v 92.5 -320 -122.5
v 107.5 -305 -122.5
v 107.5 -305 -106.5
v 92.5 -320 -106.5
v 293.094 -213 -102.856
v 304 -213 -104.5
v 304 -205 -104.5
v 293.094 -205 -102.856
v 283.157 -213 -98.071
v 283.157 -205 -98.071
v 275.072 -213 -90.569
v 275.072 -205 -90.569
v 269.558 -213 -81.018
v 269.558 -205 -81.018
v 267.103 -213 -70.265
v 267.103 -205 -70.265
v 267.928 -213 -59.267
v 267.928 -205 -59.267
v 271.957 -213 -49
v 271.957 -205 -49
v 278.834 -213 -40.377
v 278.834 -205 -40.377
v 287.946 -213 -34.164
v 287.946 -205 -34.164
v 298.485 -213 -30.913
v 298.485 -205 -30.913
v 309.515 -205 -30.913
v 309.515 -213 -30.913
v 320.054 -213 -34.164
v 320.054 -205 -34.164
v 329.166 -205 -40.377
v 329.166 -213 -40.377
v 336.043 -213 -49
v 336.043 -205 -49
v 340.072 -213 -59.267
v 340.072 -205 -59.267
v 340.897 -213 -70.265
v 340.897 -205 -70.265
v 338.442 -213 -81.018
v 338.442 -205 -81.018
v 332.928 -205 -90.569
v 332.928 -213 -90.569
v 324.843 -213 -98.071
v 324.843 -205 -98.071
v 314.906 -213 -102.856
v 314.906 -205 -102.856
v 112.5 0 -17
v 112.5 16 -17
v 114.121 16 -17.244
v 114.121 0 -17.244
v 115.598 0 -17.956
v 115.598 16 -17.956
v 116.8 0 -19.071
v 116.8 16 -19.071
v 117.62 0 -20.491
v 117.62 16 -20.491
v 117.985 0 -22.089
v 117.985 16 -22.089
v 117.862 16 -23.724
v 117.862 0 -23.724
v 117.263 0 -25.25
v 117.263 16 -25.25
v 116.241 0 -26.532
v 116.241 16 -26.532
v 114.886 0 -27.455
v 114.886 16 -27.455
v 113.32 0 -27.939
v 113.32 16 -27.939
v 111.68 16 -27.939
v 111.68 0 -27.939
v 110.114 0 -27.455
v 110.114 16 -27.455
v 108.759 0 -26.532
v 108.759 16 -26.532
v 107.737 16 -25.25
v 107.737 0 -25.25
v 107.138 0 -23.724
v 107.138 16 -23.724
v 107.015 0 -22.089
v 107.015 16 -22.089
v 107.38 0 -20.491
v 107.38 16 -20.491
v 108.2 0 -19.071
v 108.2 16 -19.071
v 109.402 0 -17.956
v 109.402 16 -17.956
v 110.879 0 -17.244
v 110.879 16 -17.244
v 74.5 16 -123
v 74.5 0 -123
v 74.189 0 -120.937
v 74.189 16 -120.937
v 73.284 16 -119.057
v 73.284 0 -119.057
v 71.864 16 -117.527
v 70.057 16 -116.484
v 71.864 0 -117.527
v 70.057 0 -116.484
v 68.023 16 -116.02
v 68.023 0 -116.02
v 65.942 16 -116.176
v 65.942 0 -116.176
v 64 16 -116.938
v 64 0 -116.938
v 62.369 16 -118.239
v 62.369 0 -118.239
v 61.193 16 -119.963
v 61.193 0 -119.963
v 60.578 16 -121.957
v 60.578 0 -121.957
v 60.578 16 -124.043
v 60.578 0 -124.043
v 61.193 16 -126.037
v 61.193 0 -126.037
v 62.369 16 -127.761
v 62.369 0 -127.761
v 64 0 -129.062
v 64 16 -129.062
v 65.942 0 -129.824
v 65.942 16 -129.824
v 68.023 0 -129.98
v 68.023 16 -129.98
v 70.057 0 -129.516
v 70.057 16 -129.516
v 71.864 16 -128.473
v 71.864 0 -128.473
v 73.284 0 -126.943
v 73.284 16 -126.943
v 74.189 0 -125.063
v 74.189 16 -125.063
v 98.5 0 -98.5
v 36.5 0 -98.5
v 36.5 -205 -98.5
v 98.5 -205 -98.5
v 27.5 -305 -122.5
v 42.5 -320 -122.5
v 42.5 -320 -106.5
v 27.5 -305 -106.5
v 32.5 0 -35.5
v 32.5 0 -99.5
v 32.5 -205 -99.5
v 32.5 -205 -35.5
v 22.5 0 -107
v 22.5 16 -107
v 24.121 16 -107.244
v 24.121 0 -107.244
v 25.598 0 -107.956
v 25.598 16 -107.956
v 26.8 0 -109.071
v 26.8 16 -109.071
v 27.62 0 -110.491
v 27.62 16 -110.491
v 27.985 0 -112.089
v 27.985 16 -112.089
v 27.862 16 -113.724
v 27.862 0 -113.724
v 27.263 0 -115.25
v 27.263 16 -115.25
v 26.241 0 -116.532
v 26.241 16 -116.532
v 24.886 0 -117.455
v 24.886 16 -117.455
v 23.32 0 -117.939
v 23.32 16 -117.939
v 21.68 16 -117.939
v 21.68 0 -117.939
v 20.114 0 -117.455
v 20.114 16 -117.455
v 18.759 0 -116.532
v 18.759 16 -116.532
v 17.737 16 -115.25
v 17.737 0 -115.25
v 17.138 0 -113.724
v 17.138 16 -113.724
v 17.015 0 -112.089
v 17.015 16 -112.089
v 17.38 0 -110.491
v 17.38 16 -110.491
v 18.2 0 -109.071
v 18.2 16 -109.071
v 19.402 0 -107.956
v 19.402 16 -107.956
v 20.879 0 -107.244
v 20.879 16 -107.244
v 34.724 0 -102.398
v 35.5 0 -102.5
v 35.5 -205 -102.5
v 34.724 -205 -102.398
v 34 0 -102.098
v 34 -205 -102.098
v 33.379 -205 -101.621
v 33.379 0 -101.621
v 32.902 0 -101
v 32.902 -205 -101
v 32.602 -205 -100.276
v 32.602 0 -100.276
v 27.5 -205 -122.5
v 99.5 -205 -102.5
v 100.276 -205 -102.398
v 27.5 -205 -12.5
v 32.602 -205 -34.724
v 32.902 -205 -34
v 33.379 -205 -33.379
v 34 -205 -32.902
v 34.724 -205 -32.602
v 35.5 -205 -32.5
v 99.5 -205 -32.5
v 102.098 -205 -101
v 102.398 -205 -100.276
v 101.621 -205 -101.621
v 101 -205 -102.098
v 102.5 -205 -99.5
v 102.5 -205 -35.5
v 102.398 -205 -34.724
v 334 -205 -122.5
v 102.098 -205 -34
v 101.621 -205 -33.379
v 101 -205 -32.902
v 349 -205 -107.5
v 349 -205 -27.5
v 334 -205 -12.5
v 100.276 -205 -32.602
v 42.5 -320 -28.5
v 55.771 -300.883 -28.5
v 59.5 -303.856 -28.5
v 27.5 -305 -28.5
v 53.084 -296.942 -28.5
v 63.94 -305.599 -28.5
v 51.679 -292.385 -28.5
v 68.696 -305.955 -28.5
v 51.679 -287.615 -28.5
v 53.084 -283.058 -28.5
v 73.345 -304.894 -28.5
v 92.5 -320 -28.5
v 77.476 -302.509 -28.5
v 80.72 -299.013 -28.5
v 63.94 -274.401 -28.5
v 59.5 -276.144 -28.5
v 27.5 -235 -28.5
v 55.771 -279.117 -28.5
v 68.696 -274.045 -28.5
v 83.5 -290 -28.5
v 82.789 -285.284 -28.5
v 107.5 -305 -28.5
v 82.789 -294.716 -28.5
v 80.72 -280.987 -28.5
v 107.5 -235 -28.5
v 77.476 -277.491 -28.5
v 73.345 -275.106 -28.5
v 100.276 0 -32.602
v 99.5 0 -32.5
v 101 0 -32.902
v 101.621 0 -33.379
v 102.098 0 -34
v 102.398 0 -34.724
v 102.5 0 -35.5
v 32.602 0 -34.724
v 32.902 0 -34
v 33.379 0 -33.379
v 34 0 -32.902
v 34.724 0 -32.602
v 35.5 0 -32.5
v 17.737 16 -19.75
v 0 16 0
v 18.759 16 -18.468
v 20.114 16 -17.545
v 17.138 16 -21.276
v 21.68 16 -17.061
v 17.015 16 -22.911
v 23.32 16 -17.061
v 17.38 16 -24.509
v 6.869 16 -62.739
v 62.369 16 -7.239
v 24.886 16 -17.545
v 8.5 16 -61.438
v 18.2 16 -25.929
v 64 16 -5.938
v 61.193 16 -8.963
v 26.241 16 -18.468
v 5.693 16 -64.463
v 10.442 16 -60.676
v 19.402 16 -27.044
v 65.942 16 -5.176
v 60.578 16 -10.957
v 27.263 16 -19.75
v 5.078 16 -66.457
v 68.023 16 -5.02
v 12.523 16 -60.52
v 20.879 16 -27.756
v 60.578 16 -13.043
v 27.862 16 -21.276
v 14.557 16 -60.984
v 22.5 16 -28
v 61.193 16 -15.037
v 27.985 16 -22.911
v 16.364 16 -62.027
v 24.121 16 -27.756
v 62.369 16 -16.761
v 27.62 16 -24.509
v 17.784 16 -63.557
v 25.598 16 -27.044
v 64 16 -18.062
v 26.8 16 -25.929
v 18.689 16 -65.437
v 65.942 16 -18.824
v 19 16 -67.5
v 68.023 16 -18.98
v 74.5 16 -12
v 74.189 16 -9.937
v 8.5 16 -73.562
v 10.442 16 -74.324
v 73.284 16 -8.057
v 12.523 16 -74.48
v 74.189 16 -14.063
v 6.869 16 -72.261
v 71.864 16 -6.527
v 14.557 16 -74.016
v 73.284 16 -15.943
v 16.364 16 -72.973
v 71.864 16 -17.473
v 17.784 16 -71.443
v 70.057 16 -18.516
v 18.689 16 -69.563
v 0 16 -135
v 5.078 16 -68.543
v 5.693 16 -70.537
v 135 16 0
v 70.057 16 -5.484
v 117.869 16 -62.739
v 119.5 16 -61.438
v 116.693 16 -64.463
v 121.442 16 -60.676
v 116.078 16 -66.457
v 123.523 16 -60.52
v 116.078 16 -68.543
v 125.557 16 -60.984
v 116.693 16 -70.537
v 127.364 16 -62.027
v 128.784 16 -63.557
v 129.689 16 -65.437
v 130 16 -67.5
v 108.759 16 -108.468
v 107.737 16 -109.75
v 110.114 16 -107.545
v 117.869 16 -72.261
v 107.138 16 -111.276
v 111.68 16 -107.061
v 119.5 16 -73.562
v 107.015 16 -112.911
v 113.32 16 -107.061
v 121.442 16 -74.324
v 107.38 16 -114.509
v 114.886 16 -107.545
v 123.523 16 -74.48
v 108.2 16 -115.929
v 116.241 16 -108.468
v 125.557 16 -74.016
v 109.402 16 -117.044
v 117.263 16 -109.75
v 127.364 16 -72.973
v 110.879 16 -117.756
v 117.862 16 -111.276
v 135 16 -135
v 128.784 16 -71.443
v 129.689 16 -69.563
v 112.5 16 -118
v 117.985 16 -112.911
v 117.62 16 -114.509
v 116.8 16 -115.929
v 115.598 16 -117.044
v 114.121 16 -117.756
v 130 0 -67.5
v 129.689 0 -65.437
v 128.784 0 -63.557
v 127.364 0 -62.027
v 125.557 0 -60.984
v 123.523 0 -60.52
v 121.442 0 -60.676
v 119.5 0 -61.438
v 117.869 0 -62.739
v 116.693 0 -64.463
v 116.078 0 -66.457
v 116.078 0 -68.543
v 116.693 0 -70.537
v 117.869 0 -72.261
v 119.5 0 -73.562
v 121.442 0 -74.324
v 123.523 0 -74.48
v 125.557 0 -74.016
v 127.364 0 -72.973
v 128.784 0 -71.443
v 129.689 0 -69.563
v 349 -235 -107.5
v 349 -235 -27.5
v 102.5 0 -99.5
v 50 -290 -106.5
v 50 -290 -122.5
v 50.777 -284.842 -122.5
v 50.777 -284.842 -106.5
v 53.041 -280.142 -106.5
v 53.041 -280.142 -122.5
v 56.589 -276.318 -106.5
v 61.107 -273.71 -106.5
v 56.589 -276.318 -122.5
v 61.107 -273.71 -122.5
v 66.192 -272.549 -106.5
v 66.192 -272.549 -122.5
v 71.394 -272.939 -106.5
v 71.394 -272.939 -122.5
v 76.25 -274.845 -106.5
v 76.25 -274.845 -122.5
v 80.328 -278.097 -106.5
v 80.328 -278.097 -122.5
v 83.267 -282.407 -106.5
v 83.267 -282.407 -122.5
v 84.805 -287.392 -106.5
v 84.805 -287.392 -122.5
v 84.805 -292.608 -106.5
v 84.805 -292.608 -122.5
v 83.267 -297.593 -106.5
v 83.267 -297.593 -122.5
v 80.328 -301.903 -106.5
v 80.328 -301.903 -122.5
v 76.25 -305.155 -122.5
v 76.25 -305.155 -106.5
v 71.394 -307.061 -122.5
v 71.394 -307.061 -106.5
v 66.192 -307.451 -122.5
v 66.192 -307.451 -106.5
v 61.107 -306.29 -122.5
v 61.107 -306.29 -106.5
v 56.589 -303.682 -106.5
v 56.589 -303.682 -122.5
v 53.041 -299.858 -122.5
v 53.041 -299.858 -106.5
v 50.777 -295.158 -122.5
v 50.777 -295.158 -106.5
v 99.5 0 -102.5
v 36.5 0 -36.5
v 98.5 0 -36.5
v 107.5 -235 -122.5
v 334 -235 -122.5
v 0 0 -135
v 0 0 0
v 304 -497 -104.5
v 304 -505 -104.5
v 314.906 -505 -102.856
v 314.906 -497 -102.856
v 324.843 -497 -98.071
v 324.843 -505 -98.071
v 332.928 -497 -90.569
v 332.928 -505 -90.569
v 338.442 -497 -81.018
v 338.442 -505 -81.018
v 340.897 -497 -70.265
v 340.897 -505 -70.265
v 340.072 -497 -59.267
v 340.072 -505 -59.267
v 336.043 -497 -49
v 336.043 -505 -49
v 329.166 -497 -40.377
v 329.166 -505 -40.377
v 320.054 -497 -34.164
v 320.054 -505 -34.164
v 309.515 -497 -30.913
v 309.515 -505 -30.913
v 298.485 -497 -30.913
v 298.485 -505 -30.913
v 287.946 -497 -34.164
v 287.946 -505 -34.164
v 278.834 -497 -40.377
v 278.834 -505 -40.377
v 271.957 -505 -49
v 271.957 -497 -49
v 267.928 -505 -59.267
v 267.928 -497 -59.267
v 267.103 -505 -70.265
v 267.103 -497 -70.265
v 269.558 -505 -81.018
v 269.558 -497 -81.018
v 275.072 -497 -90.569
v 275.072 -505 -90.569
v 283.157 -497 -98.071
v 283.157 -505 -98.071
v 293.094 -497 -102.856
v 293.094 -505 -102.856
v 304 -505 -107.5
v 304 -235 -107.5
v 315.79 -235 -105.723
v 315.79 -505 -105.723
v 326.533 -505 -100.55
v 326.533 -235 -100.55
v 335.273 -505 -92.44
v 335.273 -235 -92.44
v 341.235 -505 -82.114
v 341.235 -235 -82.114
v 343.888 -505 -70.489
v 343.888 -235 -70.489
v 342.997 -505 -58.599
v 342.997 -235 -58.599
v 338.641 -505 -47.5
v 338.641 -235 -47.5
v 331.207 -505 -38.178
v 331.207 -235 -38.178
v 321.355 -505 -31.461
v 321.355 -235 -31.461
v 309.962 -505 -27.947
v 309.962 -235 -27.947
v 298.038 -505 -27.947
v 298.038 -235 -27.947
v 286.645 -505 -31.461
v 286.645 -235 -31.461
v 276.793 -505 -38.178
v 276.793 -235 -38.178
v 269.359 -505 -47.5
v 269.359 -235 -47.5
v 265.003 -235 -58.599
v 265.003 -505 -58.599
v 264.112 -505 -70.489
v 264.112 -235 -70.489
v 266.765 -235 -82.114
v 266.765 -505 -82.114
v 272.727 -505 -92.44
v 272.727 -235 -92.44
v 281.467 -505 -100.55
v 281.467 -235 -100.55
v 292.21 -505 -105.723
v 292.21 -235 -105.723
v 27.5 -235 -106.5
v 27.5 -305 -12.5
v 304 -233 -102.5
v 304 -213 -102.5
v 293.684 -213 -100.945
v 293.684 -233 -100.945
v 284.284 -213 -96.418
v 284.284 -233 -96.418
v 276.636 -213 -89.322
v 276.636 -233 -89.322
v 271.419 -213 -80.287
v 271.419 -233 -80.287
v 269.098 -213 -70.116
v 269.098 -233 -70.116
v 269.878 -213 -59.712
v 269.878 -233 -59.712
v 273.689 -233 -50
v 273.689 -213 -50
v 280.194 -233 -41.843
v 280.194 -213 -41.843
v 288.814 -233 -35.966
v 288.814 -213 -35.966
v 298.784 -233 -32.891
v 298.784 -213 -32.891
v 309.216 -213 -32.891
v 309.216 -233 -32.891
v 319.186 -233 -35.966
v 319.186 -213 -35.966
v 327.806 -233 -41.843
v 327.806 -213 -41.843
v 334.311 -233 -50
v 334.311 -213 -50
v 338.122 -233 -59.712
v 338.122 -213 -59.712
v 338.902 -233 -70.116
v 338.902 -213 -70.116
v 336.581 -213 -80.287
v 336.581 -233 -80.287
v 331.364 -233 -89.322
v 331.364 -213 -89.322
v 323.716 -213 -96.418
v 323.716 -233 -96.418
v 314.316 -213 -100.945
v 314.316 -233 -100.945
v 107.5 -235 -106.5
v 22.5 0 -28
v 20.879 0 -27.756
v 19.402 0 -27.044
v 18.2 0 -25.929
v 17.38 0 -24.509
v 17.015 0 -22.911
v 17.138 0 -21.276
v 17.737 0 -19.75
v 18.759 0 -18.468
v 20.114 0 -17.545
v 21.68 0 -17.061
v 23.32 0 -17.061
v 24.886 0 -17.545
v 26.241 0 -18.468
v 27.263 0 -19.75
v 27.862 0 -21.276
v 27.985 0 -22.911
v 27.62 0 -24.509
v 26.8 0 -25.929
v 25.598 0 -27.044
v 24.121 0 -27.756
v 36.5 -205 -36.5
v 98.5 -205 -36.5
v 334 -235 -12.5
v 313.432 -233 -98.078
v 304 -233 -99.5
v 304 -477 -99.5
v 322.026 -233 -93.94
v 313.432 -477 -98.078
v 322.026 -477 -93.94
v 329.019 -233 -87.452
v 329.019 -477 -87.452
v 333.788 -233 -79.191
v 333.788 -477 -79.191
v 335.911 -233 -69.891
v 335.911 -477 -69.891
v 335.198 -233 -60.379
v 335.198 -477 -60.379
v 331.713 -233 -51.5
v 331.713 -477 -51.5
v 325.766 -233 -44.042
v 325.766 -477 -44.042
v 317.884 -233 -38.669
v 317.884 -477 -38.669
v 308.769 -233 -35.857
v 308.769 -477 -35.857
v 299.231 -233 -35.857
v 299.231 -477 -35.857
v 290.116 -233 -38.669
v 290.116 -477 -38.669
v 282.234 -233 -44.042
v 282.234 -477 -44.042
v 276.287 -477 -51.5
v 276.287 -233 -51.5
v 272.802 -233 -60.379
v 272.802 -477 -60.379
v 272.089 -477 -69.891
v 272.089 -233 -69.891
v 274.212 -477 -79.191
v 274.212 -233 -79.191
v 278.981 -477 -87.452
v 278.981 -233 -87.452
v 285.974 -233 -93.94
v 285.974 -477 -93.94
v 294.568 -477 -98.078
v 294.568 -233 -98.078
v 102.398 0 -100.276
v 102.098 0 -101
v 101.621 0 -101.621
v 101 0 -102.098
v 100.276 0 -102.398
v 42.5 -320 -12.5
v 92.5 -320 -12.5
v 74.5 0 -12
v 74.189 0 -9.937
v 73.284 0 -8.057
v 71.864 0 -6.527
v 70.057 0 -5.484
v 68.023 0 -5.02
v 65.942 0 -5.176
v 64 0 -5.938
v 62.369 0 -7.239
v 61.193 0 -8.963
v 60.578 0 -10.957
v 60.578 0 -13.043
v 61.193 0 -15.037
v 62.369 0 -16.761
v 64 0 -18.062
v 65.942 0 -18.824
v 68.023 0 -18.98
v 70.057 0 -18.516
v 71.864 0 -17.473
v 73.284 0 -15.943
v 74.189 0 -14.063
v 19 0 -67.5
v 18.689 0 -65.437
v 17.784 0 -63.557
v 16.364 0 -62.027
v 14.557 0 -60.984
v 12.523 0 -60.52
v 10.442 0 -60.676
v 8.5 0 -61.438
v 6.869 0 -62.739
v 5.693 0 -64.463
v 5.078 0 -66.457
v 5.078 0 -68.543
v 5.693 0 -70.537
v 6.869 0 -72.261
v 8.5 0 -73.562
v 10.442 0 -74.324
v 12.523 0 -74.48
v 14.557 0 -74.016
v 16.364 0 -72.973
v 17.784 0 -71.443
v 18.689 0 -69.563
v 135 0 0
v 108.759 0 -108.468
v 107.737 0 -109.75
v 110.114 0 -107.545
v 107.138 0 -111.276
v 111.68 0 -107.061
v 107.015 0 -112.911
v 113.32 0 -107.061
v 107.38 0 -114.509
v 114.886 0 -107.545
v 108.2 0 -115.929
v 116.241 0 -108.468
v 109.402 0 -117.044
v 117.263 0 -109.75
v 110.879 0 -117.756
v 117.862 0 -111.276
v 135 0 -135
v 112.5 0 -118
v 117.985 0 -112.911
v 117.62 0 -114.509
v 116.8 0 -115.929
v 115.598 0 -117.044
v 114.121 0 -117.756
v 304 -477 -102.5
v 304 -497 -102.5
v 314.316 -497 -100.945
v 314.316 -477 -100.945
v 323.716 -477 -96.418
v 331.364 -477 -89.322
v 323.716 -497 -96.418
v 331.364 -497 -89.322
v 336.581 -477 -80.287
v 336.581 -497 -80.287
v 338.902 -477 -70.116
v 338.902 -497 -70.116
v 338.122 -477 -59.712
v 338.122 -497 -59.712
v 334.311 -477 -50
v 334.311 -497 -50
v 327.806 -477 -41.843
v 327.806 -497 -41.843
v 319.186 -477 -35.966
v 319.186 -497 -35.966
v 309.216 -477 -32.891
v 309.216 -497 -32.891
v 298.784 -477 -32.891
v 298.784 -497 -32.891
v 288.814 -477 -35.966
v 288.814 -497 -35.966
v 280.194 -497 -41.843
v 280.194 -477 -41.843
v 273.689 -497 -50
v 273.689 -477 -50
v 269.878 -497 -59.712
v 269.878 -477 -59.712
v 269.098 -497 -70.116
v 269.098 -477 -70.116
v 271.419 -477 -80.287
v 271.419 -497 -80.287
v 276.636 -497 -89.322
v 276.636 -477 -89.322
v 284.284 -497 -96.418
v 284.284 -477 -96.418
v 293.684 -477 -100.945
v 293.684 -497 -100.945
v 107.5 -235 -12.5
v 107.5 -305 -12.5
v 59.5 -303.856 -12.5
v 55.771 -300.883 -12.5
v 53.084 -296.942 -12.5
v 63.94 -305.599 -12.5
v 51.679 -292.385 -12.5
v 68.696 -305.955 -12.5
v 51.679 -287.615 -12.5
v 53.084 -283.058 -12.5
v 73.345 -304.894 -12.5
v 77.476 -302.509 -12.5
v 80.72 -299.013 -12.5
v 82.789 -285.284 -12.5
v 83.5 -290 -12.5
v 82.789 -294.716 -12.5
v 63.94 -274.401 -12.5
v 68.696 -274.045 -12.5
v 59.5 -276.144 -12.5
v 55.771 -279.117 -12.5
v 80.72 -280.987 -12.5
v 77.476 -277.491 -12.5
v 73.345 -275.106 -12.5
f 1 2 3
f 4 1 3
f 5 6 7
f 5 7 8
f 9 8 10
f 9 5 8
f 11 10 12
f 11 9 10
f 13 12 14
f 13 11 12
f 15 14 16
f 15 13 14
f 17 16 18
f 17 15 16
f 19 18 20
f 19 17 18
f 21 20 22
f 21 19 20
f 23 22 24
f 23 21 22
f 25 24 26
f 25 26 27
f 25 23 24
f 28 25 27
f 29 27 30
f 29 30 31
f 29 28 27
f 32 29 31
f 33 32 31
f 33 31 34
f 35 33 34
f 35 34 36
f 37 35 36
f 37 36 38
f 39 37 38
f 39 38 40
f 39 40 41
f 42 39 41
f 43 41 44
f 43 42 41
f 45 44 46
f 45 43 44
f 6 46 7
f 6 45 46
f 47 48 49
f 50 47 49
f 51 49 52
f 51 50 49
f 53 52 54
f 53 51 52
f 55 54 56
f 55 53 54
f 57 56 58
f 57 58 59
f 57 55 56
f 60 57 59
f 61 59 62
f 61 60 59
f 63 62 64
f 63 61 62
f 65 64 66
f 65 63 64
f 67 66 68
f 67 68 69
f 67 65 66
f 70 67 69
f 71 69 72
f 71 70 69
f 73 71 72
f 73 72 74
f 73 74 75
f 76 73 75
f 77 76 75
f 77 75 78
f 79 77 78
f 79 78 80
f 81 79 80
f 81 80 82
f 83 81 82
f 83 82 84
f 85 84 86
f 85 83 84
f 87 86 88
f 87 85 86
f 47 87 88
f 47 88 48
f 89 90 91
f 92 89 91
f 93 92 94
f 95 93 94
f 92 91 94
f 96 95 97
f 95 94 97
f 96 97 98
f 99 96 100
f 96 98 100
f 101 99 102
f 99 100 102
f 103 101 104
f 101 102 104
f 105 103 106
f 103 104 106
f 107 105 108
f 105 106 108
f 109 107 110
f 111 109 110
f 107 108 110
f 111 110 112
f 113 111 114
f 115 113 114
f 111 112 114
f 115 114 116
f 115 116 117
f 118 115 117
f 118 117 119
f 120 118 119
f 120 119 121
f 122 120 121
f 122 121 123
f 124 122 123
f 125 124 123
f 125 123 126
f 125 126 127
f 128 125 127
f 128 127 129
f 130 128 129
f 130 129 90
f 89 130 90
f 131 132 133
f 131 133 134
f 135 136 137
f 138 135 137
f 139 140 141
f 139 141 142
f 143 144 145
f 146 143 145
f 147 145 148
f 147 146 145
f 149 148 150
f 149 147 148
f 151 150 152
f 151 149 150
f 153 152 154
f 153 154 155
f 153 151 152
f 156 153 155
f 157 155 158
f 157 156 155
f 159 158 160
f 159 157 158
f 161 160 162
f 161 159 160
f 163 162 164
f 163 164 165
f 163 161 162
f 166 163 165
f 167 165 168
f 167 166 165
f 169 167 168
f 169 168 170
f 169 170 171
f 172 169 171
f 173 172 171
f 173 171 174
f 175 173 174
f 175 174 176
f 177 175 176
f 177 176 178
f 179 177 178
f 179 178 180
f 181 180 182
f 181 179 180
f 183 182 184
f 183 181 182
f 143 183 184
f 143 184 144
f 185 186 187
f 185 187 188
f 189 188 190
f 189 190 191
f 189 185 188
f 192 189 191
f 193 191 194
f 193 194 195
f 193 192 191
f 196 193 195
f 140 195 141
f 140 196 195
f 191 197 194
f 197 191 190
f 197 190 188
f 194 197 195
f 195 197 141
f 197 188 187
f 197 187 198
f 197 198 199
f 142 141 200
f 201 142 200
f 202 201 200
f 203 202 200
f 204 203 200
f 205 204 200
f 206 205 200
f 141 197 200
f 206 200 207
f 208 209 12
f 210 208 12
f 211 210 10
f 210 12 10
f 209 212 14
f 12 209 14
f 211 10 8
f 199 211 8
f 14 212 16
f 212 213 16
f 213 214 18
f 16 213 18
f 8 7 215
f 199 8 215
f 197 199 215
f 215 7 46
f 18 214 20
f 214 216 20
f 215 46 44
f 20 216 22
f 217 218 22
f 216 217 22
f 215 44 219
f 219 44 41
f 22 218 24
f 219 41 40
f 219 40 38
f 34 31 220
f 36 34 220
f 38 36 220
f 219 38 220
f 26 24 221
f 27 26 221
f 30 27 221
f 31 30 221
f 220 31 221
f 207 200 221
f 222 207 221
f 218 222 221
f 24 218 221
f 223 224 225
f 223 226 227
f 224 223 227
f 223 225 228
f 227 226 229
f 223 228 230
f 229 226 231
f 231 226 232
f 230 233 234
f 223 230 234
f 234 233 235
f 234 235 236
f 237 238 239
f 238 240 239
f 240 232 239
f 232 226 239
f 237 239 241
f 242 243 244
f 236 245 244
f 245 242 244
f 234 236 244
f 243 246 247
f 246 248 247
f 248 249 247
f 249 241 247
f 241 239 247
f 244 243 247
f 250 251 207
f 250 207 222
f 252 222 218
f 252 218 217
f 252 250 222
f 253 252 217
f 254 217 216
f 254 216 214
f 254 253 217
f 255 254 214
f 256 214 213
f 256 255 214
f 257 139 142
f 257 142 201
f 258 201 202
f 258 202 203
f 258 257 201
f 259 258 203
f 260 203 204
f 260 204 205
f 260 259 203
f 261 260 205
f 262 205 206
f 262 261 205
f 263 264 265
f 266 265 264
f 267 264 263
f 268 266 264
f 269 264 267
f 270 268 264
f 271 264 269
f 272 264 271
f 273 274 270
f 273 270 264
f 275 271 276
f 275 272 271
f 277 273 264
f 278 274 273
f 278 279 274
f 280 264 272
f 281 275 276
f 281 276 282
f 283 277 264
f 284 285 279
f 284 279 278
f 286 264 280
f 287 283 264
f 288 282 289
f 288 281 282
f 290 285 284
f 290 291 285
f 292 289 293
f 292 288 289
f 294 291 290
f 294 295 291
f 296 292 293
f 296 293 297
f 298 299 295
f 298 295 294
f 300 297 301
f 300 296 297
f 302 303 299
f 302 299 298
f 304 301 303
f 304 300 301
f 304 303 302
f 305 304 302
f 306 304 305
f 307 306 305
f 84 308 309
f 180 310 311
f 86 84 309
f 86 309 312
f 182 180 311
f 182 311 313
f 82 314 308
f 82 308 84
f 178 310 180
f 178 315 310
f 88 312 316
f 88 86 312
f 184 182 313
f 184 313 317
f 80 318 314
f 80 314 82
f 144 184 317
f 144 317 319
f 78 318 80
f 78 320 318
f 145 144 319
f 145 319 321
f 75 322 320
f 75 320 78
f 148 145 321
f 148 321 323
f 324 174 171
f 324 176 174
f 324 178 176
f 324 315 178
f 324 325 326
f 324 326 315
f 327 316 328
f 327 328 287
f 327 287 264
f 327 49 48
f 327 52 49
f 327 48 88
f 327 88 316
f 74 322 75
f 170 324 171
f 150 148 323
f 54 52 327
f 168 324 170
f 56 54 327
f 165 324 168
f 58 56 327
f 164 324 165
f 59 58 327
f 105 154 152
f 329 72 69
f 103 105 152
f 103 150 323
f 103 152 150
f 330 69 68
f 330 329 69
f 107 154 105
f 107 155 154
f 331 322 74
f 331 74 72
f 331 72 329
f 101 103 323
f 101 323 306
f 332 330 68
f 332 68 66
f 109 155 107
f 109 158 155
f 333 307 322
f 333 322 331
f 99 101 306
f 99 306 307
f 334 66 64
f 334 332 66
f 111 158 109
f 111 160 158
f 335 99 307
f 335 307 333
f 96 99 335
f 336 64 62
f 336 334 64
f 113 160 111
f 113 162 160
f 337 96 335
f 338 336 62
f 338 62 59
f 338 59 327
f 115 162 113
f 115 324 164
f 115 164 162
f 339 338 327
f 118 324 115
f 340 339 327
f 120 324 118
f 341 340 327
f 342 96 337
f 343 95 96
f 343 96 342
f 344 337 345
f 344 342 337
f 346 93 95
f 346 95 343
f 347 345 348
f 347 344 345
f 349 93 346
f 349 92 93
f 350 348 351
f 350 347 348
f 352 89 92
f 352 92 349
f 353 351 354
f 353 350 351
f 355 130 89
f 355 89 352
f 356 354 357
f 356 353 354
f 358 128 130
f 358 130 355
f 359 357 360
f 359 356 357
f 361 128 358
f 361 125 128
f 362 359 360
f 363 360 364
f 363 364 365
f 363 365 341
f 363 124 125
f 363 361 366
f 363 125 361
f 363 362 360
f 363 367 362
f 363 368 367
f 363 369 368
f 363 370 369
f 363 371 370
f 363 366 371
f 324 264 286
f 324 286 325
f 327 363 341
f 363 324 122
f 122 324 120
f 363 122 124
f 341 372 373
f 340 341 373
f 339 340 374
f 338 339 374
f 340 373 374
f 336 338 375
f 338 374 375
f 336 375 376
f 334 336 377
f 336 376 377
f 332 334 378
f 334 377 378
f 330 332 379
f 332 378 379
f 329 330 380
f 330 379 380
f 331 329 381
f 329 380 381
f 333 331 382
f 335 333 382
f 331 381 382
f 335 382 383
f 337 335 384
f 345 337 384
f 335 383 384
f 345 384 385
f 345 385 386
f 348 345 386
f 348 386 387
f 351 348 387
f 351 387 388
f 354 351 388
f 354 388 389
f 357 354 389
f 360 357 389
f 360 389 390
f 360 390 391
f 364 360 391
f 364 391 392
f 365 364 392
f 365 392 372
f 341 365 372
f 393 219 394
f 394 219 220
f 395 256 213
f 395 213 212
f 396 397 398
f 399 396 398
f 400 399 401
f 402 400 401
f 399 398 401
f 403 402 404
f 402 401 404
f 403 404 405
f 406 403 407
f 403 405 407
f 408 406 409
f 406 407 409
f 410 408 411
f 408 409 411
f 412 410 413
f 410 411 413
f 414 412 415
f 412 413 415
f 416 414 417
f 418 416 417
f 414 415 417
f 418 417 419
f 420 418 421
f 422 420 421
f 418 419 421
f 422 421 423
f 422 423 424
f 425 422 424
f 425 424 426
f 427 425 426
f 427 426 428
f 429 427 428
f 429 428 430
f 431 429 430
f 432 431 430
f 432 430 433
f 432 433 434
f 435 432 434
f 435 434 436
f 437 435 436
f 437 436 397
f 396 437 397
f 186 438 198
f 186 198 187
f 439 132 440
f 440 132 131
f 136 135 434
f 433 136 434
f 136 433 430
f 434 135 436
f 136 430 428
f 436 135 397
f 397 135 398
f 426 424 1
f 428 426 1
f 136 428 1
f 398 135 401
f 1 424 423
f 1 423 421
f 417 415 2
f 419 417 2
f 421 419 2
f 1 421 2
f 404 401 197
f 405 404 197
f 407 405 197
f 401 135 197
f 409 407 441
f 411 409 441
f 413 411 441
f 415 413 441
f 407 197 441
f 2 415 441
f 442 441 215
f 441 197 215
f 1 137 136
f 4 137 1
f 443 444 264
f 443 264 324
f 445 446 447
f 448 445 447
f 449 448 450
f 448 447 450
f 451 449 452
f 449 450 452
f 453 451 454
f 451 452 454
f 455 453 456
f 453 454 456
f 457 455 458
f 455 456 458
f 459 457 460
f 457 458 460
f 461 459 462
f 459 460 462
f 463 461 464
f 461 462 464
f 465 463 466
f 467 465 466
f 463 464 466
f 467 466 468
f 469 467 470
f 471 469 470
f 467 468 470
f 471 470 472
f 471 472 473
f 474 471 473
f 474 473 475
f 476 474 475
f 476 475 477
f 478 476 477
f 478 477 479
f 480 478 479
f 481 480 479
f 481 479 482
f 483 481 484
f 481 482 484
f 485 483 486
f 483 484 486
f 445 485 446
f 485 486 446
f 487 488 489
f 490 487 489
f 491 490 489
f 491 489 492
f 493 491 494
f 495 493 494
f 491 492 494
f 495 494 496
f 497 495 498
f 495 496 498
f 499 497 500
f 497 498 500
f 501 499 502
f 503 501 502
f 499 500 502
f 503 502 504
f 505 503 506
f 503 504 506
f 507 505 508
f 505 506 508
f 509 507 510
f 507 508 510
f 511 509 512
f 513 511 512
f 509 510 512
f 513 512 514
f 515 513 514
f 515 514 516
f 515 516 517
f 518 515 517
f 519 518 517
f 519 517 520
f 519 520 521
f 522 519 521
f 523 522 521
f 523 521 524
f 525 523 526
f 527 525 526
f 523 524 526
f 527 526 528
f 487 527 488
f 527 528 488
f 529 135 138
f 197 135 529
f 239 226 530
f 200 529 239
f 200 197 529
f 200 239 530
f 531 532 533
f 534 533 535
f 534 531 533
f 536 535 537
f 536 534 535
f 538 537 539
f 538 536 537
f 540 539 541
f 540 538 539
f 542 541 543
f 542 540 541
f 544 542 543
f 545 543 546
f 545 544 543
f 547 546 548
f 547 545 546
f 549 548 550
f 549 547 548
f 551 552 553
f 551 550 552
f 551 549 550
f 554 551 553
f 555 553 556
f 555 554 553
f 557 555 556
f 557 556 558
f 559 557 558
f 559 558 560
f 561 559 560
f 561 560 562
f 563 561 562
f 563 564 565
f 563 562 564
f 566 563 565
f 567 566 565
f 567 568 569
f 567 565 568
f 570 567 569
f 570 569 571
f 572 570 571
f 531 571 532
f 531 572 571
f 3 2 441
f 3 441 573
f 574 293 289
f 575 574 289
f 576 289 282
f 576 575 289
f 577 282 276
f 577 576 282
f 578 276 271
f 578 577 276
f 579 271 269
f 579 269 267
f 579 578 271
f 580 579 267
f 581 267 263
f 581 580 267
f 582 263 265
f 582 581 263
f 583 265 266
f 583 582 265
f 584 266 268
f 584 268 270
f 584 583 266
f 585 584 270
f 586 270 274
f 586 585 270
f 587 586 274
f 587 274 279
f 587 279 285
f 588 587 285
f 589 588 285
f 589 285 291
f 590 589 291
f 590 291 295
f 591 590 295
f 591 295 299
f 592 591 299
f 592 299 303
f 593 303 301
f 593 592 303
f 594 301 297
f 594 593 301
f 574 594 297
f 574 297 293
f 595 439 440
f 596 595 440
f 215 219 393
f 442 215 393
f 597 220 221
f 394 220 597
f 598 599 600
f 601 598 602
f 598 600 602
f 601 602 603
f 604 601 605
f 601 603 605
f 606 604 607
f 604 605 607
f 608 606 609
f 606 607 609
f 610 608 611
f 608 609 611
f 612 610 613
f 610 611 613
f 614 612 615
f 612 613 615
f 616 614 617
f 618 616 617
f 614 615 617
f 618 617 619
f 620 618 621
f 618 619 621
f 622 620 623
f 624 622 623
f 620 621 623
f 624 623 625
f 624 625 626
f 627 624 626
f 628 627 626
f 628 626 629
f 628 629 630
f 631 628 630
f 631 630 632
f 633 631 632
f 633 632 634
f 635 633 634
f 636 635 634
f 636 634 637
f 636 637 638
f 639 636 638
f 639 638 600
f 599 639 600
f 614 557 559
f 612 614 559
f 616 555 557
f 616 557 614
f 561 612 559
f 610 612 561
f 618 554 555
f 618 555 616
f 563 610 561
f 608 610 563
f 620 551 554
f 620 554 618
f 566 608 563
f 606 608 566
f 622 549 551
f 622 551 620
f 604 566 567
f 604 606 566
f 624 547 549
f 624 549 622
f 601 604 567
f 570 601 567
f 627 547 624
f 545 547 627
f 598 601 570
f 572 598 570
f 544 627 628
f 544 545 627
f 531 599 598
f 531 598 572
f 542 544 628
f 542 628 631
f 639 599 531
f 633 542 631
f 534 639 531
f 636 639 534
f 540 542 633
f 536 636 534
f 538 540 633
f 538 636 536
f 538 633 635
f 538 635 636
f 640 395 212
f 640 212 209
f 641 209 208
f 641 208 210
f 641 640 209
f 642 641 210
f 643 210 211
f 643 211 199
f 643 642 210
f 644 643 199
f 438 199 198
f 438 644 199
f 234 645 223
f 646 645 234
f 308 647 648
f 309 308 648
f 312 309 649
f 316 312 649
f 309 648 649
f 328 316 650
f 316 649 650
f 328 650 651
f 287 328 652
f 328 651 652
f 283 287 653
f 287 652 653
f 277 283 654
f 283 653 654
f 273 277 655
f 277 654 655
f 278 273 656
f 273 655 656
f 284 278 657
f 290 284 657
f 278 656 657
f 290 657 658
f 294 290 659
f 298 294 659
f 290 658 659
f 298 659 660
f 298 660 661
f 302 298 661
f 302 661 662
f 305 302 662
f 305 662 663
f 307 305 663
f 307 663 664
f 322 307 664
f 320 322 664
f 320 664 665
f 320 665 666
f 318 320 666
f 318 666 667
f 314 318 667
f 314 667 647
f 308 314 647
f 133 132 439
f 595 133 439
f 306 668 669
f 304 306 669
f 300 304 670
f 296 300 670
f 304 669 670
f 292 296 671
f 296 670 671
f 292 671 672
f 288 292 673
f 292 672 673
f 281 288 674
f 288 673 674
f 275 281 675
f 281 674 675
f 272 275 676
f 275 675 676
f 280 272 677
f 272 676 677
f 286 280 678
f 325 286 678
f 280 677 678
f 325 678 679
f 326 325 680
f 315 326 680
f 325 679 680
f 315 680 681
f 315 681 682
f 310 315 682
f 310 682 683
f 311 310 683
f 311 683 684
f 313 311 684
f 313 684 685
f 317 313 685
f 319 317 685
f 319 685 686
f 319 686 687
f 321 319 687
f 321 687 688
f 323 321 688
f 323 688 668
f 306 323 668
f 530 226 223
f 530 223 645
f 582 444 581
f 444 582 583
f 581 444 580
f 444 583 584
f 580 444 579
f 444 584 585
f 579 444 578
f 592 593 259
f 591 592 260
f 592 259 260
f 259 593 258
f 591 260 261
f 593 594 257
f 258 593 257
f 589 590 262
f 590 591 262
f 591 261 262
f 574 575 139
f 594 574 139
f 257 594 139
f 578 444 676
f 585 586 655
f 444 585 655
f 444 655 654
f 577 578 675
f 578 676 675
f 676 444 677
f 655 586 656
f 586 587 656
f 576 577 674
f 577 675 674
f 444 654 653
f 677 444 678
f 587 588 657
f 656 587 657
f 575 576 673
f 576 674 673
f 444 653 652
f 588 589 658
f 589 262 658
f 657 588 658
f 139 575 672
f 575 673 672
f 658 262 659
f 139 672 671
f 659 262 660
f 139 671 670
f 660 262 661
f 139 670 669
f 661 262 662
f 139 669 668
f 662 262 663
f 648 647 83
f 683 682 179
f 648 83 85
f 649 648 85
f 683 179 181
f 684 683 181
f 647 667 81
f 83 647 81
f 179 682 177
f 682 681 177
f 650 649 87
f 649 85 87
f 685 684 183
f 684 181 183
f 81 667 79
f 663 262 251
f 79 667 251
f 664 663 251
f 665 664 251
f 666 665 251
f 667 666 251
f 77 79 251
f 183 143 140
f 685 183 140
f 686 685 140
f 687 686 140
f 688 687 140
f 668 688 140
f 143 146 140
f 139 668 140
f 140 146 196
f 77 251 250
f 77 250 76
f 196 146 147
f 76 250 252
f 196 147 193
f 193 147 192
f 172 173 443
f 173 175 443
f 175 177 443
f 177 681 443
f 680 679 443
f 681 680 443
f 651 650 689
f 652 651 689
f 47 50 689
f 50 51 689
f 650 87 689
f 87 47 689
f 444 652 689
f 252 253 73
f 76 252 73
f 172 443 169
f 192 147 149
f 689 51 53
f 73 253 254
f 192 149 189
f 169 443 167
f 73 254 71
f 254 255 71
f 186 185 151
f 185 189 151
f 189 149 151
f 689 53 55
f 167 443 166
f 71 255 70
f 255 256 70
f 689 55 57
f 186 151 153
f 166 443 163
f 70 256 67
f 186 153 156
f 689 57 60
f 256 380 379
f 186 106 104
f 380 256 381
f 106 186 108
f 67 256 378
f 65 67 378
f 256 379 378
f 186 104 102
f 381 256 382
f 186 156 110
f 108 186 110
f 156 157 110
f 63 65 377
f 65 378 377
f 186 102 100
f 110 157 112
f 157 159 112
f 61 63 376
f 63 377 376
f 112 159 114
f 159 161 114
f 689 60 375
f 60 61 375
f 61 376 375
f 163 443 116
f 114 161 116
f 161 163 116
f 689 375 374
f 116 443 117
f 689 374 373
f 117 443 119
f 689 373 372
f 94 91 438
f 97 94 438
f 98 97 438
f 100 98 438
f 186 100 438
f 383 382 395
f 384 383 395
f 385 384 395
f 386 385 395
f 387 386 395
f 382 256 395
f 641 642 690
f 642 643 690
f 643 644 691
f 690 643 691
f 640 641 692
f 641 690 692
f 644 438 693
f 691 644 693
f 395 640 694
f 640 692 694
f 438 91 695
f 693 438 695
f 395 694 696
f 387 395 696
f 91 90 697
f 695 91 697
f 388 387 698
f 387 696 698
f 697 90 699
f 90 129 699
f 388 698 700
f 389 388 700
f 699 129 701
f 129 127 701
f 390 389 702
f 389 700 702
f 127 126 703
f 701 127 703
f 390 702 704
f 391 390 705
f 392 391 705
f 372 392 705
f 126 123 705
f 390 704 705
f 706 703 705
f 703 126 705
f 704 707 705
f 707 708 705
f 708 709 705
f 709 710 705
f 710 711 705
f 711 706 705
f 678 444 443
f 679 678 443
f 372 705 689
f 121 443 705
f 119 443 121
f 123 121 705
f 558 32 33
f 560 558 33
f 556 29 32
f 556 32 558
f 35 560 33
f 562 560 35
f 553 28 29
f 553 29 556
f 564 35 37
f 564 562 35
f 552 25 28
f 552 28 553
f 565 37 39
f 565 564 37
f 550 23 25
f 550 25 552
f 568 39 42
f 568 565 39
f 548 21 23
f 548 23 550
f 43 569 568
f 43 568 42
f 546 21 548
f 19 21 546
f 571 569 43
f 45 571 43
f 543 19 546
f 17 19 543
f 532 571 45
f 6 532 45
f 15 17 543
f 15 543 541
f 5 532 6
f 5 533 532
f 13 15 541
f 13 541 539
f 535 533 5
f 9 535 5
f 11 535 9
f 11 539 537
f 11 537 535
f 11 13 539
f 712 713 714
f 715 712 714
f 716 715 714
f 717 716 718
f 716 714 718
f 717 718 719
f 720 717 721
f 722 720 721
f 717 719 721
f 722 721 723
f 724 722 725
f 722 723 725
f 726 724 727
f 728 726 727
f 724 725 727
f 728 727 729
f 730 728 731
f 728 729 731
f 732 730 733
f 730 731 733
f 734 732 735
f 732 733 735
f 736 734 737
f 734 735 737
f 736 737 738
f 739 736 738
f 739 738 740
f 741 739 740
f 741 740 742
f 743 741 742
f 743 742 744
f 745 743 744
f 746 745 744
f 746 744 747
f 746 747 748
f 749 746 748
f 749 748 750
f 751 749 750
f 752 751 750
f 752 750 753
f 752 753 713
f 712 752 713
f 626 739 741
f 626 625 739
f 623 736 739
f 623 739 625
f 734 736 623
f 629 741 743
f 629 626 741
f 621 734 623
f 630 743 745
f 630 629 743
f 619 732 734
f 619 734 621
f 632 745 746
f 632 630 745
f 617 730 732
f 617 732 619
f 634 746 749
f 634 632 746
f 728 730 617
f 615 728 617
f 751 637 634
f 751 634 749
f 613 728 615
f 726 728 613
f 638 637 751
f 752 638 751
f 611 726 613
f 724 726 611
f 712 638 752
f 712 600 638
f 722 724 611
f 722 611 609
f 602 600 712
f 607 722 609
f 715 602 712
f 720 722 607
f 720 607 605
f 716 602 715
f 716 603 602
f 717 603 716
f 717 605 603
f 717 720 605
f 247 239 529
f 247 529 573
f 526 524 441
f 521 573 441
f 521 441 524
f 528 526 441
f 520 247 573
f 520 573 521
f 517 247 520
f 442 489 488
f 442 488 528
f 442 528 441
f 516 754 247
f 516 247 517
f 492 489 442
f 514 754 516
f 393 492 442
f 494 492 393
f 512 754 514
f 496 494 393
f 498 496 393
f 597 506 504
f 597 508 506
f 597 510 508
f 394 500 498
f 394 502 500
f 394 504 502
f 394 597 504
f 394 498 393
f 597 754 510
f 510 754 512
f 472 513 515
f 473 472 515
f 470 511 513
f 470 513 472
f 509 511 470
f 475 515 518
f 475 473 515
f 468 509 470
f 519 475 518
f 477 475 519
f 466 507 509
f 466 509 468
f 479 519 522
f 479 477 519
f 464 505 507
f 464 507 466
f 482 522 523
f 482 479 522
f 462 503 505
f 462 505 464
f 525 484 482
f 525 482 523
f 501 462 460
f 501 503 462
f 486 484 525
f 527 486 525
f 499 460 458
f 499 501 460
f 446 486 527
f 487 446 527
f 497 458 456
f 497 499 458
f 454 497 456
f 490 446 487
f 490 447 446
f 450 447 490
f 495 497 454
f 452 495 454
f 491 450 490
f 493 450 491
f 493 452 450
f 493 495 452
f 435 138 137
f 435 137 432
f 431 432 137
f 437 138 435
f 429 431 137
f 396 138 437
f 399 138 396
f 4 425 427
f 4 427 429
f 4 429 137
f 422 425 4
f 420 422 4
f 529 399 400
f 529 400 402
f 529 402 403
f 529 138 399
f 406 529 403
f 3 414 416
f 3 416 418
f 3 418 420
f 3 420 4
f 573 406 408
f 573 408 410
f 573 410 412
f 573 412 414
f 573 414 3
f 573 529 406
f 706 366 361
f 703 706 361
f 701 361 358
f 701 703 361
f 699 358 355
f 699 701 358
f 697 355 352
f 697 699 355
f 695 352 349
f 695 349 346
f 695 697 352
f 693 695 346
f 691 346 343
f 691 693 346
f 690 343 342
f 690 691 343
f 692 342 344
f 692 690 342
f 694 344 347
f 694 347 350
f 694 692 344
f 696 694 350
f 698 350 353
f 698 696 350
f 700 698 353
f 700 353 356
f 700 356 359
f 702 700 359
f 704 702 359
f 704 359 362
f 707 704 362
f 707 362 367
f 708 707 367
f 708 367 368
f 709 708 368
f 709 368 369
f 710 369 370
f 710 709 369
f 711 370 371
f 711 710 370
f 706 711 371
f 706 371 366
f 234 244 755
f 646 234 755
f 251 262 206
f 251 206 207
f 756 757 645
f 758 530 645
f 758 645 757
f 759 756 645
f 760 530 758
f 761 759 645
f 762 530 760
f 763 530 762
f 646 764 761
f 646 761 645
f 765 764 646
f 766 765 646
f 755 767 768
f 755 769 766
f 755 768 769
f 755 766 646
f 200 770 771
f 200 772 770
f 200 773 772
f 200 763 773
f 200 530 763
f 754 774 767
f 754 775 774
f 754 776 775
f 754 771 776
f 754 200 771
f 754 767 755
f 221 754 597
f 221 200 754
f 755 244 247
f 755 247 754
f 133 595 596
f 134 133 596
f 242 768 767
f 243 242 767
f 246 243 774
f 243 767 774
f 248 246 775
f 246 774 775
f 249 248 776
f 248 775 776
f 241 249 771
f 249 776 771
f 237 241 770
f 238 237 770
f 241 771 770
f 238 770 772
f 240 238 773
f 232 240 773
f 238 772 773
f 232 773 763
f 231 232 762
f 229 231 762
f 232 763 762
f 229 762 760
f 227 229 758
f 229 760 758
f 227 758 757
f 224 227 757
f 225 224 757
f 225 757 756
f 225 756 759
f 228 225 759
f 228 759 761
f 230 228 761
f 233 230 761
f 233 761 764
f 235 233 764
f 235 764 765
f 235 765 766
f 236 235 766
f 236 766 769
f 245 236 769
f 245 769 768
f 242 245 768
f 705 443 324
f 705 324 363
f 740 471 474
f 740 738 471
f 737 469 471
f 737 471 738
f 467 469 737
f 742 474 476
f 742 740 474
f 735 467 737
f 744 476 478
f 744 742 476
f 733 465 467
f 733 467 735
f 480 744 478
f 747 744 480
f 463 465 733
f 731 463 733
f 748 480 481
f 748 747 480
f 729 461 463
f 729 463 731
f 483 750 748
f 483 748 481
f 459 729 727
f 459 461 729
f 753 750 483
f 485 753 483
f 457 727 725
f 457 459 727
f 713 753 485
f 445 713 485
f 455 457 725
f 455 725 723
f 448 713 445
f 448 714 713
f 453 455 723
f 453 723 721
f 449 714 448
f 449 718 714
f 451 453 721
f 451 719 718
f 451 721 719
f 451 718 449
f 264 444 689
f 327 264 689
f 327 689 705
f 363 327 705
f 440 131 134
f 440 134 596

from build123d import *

# Parameters (mm, degrees)
SCHIZZO1_W                = 135
SCHIZZO1_H                = 135
SCHIZZO1_R                = 5.5
ESTRUSIONE1_DEPTH         = 16
SCHIZZO2_W                = 62
SCHIZZO2_H                = 62
ESTRUSIONE_SOTTILE1_DEPTH = 205
SCHIZZO3_W                = 321.5
SCHIZZO3_H                = 110
ESTRUSIONE2_DEPTH         = 30
SCHIZZO4_R                = 40
ESTRUSIONE3_DEPTH         = 270
SCHIZZO6_R                = 32
ESTRUSIONE4_DEPTH         = 642.456935421
SCHIZZO7_R                = 35
ESTRUSIONE5_DEPTH         = 28
ESTRUSIONE6_START         = -28
SCHIZZO8_R                = 35
ESTRUSIONE6_DEPTH         = 28
SCHIZZO9_W                = 80
SCHIZZO9_H                = 16
ESTRUSIONE7_DEPTH         = 85
SCHIZZO10_R               = 16
ESTRUSIONE8_DEPTH         = 40
SCHIZZO11_R               = 17.5
ESTRUSIONE9_DEPTH         = 40
SMUSSO1_SIZE              = 15
SCHIZZO12_R               = 37
ESTRUSIONE10_DEPTH        = 8
ESTRUSIONE11_START        = -8
SCHIZZO13_R               = 37
ESTRUSIONE11_DEPTH        = 8
M16_TAPPED_HOLE1_D        = 14
M16_TAPPED_HOLE1_DEPTH    = 42
M16_TAPPED_HOLE1_TIP      = 4.206024333


with BuildPart() as part:
    # Schizzo1 → Estrusione1 (new body)
    with BuildSketch(Plane(origin=(0, 0, 0), x_dir=(1, 0, 0), z_dir=(0, 1, 0))):
        with Locations((67.5, 67.5)):
            Rectangle(SCHIZZO1_W, SCHIZZO1_H)
        with Locations((22.5, 112.5)):
            Circle(SCHIZZO1_R, mode=Mode.SUBTRACT)
        with Locations((112.5, 112.5)):
            Circle(SCHIZZO1_R, mode=Mode.SUBTRACT)
        with Locations((112.5, 22.5)):
            Circle(SCHIZZO1_R, mode=Mode.SUBTRACT)
        with Locations((22.5, 22.5)):
            Circle(SCHIZZO1_R, mode=Mode.SUBTRACT)
    extrude(amount=ESTRUSIONE1_DEPTH)

    # Schizzo2 → Estrusione-Sottile1 (add)
    with BuildSketch(Plane.XZ):
        with BuildLine():
            Line((32.5, -99.5), (32.5, -35.5))
            ThreePointArc((32.5, -35.5), (33.378679656, -33.378679656), (35.5, -32.5))
            Line((35.5, -32.5), (99.5, -32.5))
            ThreePointArc((99.5, -32.5), (101.621320344, -33.378679656), (102.5, -35.5))
            Line((102.5, -35.5), (102.5, -99.5))
            ThreePointArc((102.5, -99.5), (101.621320344, -101.621320344), (99.5, -102.5))
            Line((99.5, -102.5), (35.5, -102.5))
            ThreePointArc((35.5, -102.5), (33.378679656, -101.621320344), (32.5, -99.5))
        make_face()
        with Locations((67.5, -67.5)):
            Rectangle(SCHIZZO2_W, SCHIZZO2_H, mode=Mode.SUBTRACT)
    extrude(amount=ESTRUSIONE_SOTTILE1_DEPTH)

    # Schizzo3 → Estrusione2 (add)
    with BuildSketch(Plane.XZ.offset(205)):
        with Locations((188.25, -67.5)):
            Rectangle(SCHIZZO3_W, SCHIZZO3_H)
    extrude(amount=ESTRUSIONE2_DEPTH)

    # Schizzo4 → Estrusione3 (add)
    with BuildSketch(Plane.XZ.offset(235)):
        with Locations((304, -67.5)):
            Circle(SCHIZZO4_R)
    extrude(amount=ESTRUSIONE3_DEPTH)

    # Schizzo6 → Estrusione4 (cut, through all)
    with BuildSketch(Plane.XZ.offset(505)):
        with Locations((304, -67.5)):
            Circle(SCHIZZO6_R)
    extrude(amount=-ESTRUSIONE4_DEPTH, mode=Mode.SUBTRACT)

    # Schizzo7 → Estrusione5 (cut)
    with BuildSketch(Plane.XZ.offset(505)):
        with Locations((304, -67.5)):
            Circle(SCHIZZO7_R)
    extrude(amount=-ESTRUSIONE5_DEPTH, mode=Mode.SUBTRACT)

    # Schizzo8 → Estrusione6 (cut)
    with BuildSketch(Plane(origin=(0, -205, 0), x_dir=(1, 0, 0), z_dir=(0, 1, 0)).offset(ESTRUSIONE6_START)):
        with Locations((304, 67.5)):
            Circle(SCHIZZO8_R)
    extrude(amount=ESTRUSIONE6_DEPTH, mode=Mode.SUBTRACT)

    # Schizzo9 → Estrusione7 (add)
    with BuildSketch(Plane.XZ.offset(235)):
        with Locations((67.5, -114.5)):
            Rectangle(SCHIZZO9_W, SCHIZZO9_H)
        with Locations((67.5, -20.5)):
            Rectangle(SCHIZZO9_W, SCHIZZO9_H)
    extrude(amount=ESTRUSIONE7_DEPTH)

    # Schizzo10 → Estrusione8 (cut)
    with BuildSketch(Plane.XY.offset(-12.5)):
        with Locations((67.5, -290)):
            Circle(SCHIZZO10_R)
    extrude(amount=-ESTRUSIONE8_DEPTH, mode=Mode.SUBTRACT)

    # Schizzo11 → Estrusione9 (cut)
    with BuildSketch(Plane(origin=(0, 0, -122.5), x_dir=(-1, 0, 0), z_dir=(0, 0, -1))):
        with Locations((-67.5, -290)):
            Circle(SCHIZZO11_R)
    extrude(amount=-ESTRUSIONE9_DEPTH, mode=Mode.SUBTRACT)

    # Smusso1
    smusso1_edges = [part.edges().sort_by_distance(p)[0] for p in [
        (349, -220, -12.5),
        (349, -220, -122.5),
        (27.5, -320, -20.5),
        (107.5, -320, -20.5),
        (27.5, -320, -114.5),
        (107.5, -320, -114.5),
    ]]
    chamfer(smusso1_edges, length=SMUSSO1_SIZE)

    # Schizzo12 → Estrusione10 (cut)
    with BuildSketch(Plane.XZ.offset(505)):
        with Locations((304, -67.5)):
            Circle(SCHIZZO12_R)
    extrude(amount=-ESTRUSIONE10_DEPTH, mode=Mode.SUBTRACT)

    # Schizzo13 → Estrusione11 (cut)
    with BuildSketch(Plane(origin=(0, -205, 0), x_dir=(1, 0, 0), z_dir=(0, 1, 0)).offset(ESTRUSIONE11_START)):
        with Locations((304, 67.5)):
            Circle(SCHIZZO13_R)
    extrude(amount=ESTRUSIONE11_DEPTH, mode=Mode.SUBTRACT)

    # M16 Tapped Hole1
    with Locations(Plane(origin=(0, 16, 0), x_dir=(-1, 0, 0), z_dir=(0, 1, 0))):
        with Locations((-67.5, -123), (-12, -67.5), (-67.5, -12), (-123, -67.5)):
            Hole(M16_TAPPED_HOLE1_D / 2, depth=M16_TAPPED_HOLE1_DEPTH)
            with Locations((0, 0, -(M16_TAPPED_HOLE1_DEPTH + M16_TAPPED_HOLE1_TIP / 2))):  # 118° drill point
                Cone(0, M16_TAPPED_HOLE1_D / 2, M16_TAPPED_HOLE1_TIP, mode=Mode.SUBTRACT)


solid = part.part
